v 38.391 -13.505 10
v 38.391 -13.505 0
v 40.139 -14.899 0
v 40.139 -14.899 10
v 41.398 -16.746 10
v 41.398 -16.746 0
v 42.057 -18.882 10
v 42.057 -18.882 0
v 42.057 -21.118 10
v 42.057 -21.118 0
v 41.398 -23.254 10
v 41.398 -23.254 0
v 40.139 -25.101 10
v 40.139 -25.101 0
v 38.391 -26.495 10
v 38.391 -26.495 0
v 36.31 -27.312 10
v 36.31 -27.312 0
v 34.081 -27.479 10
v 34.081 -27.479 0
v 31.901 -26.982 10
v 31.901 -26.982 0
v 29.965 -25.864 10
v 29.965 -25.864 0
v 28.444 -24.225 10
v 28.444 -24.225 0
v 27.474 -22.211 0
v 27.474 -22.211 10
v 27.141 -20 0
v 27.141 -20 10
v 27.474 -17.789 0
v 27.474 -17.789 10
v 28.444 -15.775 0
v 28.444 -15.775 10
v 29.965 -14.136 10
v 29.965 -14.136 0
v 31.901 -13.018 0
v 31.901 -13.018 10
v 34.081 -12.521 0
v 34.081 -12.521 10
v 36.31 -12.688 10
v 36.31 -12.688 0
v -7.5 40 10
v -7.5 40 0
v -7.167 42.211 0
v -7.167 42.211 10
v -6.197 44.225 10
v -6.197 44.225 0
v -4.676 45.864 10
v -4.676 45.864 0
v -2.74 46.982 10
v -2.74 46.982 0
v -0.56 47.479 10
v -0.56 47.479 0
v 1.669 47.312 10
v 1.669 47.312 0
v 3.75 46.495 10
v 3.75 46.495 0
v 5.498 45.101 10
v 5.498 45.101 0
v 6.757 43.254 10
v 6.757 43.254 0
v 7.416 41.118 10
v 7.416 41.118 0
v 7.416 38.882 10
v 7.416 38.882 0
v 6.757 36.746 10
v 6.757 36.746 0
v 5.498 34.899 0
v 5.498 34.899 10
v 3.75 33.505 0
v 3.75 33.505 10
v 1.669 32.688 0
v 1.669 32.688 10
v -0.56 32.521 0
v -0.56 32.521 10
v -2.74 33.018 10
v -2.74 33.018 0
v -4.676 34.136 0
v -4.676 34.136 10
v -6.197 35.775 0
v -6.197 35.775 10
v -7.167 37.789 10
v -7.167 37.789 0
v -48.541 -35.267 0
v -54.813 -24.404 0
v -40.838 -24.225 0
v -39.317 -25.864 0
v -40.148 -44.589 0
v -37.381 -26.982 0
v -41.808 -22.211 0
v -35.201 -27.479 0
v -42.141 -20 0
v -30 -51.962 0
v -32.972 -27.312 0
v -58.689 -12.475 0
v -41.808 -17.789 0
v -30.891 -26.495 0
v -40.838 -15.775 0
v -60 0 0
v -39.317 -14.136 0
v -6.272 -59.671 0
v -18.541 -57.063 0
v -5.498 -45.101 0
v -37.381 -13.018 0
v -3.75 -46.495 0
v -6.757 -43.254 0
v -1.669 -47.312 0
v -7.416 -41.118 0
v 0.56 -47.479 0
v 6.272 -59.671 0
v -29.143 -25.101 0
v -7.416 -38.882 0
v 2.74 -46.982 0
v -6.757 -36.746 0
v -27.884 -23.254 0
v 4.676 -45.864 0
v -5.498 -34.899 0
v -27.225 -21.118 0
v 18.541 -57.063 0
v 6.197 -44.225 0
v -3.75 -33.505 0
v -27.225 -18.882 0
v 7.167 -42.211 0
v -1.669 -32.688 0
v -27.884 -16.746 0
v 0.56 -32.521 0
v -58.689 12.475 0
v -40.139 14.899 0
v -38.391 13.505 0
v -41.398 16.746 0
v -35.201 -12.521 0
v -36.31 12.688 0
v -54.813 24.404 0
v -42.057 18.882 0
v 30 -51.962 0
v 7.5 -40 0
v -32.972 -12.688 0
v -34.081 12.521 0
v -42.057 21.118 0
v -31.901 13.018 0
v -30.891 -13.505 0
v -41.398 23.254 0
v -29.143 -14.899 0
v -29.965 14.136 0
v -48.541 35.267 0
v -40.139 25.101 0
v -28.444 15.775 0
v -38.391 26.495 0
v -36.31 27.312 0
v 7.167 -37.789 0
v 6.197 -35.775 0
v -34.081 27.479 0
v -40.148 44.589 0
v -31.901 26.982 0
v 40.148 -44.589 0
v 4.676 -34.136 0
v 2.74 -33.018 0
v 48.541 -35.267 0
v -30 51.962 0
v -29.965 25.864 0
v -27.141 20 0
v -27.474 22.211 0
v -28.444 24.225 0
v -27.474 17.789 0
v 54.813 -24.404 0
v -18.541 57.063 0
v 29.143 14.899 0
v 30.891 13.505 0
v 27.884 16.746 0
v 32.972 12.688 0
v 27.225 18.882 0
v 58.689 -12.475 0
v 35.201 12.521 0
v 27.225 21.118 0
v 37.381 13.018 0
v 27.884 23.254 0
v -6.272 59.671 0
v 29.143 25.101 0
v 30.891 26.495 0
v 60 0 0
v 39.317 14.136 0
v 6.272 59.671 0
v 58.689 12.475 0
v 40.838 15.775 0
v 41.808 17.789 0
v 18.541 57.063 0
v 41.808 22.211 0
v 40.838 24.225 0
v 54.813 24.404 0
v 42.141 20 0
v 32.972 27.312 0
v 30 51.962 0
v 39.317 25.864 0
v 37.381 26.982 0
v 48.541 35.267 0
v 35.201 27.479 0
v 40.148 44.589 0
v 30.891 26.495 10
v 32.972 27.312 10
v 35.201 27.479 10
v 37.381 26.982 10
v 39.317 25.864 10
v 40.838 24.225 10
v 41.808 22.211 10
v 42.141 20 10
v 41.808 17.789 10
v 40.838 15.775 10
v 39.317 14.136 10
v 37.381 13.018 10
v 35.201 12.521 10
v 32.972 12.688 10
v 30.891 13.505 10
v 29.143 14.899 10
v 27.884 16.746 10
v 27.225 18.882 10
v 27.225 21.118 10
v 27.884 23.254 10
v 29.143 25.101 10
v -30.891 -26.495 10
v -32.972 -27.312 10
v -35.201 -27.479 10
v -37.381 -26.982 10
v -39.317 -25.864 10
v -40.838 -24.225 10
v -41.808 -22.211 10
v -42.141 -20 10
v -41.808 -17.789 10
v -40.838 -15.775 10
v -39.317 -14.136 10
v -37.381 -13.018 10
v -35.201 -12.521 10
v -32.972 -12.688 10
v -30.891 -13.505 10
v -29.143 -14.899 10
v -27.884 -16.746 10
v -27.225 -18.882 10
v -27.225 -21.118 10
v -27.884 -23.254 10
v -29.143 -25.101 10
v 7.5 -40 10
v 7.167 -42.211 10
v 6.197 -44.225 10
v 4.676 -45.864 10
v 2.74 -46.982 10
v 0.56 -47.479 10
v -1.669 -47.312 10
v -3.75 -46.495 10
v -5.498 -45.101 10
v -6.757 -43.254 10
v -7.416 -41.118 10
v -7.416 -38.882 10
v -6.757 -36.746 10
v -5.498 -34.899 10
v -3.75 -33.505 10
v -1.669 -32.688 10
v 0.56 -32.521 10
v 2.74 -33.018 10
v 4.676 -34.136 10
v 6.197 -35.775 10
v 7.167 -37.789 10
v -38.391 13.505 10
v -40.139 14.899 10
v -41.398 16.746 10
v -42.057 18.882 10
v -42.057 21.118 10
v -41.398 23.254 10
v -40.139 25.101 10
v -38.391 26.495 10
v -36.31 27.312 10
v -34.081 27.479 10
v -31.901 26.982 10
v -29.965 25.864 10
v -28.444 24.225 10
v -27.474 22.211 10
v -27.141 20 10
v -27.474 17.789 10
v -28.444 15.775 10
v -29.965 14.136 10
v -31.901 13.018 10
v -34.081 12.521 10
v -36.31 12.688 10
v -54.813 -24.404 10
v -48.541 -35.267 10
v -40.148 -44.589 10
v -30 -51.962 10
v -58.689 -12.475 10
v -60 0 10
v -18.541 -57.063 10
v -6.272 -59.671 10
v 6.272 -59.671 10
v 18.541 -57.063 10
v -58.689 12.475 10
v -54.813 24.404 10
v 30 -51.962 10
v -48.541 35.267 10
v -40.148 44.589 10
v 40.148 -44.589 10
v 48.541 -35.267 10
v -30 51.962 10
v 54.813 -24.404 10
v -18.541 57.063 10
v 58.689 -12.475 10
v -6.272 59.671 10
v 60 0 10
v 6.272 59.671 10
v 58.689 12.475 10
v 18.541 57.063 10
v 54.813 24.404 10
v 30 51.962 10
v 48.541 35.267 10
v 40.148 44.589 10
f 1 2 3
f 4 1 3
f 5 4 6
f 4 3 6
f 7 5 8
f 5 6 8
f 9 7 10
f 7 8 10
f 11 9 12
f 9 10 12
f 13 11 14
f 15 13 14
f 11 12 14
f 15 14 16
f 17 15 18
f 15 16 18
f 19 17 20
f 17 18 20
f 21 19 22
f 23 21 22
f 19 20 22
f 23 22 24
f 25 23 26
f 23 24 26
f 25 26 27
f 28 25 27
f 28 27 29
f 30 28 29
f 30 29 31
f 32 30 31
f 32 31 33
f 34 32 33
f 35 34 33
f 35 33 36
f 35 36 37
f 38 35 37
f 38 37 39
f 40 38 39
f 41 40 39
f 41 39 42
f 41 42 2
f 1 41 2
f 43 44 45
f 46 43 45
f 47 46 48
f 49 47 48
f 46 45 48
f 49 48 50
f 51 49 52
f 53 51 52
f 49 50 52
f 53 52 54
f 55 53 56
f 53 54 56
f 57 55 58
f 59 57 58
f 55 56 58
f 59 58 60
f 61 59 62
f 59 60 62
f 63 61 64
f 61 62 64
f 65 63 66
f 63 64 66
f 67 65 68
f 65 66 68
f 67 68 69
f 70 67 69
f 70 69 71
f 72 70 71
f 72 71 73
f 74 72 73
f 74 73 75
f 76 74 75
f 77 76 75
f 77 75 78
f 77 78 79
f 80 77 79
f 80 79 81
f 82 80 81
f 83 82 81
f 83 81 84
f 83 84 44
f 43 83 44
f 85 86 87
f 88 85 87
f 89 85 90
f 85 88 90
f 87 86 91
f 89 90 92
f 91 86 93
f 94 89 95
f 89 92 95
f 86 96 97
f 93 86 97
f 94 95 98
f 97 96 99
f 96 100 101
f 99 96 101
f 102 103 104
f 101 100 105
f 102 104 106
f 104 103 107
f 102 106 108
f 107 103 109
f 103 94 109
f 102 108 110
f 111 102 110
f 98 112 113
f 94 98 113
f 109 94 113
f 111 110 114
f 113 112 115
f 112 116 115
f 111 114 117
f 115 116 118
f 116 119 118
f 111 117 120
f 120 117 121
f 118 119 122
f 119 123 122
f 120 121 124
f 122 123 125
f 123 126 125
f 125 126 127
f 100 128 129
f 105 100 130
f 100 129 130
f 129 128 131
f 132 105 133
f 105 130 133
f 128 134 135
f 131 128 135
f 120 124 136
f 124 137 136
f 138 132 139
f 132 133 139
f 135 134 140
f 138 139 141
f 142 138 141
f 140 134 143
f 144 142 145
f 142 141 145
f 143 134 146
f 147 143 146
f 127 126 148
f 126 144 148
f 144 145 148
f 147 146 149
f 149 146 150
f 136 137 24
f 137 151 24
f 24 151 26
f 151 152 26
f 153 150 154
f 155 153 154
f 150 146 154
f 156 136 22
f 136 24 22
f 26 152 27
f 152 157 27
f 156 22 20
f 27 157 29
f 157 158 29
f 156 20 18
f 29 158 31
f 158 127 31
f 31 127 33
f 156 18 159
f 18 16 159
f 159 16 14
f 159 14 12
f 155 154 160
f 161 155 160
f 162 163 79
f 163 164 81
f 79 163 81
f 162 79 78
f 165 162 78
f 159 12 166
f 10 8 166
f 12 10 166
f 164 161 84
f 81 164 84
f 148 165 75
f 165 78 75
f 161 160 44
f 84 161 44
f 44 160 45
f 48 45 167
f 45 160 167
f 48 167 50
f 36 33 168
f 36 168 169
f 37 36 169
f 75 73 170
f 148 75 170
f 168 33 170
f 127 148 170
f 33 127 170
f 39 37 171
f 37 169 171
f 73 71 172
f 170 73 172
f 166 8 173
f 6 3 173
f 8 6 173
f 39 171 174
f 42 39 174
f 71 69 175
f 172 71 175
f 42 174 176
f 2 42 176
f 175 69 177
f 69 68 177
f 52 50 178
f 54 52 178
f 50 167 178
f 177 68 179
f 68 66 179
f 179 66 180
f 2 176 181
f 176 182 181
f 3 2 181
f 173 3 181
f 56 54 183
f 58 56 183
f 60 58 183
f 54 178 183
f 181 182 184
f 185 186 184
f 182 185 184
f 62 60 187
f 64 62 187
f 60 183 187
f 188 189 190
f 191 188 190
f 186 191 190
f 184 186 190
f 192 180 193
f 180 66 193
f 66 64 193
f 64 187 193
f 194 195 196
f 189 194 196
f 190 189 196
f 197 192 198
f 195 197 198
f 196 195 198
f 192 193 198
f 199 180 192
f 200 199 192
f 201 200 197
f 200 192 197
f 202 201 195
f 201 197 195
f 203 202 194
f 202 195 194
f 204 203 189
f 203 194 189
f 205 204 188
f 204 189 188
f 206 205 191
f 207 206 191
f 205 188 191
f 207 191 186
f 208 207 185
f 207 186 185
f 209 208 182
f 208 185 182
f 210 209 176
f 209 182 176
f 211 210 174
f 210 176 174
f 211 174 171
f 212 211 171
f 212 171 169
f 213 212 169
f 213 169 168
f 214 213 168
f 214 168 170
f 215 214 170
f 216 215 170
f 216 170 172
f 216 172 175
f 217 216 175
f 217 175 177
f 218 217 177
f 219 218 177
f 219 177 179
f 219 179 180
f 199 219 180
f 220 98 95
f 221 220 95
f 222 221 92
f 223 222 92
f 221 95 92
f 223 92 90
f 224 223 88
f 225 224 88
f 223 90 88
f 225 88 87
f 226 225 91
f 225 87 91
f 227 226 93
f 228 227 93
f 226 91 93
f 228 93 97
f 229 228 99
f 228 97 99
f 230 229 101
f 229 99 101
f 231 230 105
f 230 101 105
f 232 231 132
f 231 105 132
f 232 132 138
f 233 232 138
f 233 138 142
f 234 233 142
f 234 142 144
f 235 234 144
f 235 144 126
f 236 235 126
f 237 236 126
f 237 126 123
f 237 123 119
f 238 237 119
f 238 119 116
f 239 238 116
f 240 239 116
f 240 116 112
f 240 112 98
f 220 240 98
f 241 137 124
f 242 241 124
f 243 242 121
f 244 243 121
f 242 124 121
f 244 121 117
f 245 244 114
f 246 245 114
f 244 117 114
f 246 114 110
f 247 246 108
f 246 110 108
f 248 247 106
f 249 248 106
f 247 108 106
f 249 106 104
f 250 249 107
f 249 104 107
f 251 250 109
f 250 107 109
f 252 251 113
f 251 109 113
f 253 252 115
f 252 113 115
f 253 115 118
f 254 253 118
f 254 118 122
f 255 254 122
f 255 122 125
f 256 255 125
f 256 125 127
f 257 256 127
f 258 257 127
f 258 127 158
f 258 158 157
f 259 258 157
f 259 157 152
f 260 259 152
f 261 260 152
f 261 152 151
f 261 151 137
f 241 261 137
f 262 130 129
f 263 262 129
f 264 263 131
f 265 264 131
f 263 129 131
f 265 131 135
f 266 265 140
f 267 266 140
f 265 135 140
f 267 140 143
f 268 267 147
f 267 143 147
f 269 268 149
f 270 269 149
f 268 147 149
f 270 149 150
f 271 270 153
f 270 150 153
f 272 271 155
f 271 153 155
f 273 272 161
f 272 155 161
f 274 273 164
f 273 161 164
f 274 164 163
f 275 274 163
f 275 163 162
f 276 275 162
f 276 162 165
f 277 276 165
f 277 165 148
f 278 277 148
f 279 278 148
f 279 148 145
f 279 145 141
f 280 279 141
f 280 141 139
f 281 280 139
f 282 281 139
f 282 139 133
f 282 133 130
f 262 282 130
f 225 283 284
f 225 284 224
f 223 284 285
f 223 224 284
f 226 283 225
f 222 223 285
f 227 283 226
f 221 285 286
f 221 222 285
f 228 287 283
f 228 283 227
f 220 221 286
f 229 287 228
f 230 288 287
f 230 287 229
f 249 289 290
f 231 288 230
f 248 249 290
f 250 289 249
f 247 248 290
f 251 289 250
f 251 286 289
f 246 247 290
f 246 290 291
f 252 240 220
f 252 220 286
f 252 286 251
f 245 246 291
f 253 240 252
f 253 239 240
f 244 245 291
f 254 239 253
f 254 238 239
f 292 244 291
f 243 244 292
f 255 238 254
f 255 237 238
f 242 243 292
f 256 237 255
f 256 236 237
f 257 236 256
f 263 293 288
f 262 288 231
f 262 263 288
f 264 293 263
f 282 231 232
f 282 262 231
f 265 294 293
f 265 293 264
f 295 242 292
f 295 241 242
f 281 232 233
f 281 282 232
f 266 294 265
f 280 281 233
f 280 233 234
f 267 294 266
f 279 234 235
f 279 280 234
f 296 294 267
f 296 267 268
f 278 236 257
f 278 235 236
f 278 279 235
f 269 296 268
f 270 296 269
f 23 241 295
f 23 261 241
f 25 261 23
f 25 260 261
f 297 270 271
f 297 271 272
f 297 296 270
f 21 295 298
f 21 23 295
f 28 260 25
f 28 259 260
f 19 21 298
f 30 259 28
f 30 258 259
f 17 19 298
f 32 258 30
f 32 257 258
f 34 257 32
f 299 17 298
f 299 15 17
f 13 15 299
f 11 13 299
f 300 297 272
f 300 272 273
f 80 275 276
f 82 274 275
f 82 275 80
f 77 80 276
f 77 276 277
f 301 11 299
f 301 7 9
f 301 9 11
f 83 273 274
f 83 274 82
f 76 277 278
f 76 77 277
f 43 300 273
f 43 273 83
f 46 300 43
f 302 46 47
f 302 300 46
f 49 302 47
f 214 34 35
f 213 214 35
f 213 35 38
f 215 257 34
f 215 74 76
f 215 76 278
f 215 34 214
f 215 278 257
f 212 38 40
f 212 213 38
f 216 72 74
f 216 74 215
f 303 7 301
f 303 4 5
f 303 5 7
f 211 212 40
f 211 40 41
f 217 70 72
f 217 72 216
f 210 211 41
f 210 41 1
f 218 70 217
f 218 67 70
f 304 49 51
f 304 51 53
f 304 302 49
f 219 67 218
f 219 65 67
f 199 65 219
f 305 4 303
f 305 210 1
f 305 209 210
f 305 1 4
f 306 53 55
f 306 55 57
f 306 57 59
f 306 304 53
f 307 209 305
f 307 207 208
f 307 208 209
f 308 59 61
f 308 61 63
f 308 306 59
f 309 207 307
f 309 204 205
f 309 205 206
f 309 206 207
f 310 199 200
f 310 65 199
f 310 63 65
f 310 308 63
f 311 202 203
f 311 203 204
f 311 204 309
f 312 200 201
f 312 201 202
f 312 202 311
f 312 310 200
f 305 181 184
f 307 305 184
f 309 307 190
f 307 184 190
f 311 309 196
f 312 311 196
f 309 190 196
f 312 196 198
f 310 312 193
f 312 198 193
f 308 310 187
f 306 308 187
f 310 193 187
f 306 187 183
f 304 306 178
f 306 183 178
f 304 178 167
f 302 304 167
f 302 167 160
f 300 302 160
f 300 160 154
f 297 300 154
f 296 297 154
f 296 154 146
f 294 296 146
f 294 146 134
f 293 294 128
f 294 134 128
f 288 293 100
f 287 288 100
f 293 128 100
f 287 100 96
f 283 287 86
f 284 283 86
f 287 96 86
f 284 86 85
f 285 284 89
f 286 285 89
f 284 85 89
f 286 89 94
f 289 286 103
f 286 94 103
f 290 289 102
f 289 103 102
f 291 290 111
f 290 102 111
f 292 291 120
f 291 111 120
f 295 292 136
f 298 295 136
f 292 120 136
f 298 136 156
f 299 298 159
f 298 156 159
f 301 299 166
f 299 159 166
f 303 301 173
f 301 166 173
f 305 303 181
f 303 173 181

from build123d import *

# Parameters (mm, degrees)
SKICA1_R                 = 60
VYSUNOUT1_DEPTH          = 10
SKICA7_R                 = 7.5
ODEBRAT_VYSUNUT_M1_DEPTH = 11
KRUHOV_POLE1_COUNT       = 6


with BuildPart() as part:
    # Skica1 → Vysunout1 (new body)
    with BuildSketch(Plane.XY):
        Circle(SKICA1_R)
    extrude(amount=VYSUNOUT1_DEPTH)

    # Skica7 → Odebrat vysunutím1 (cut, through all)
    with BuildSketch(Plane(origin=(0, 0, 0), x_dir=(-1, 0, 0), z_dir=(0, 0, -1))):
        with Locations((0, 40)):
            Circle(SKICA7_R)
    odebrat_vysunut_m1 = extrude(amount=-ODEBRAT_VYSUNUT_M1_DEPTH, mode=Mode.SUBTRACT)

    # Kruhové pole1: Odebrat vysunutím1 ×6 about axis
    kruhov_pole1_axis = Axis((0, 0, 0), (0, 0, 1))
    for i in range(1, KRUHOV_POLE1_COUNT):
        add(odebrat_vysunut_m1.rotate(kruhov_pole1_axis, i * 360 / KRUHOV_POLE1_COUNT), mode=Mode.SUBTRACT)


solid = part.part
